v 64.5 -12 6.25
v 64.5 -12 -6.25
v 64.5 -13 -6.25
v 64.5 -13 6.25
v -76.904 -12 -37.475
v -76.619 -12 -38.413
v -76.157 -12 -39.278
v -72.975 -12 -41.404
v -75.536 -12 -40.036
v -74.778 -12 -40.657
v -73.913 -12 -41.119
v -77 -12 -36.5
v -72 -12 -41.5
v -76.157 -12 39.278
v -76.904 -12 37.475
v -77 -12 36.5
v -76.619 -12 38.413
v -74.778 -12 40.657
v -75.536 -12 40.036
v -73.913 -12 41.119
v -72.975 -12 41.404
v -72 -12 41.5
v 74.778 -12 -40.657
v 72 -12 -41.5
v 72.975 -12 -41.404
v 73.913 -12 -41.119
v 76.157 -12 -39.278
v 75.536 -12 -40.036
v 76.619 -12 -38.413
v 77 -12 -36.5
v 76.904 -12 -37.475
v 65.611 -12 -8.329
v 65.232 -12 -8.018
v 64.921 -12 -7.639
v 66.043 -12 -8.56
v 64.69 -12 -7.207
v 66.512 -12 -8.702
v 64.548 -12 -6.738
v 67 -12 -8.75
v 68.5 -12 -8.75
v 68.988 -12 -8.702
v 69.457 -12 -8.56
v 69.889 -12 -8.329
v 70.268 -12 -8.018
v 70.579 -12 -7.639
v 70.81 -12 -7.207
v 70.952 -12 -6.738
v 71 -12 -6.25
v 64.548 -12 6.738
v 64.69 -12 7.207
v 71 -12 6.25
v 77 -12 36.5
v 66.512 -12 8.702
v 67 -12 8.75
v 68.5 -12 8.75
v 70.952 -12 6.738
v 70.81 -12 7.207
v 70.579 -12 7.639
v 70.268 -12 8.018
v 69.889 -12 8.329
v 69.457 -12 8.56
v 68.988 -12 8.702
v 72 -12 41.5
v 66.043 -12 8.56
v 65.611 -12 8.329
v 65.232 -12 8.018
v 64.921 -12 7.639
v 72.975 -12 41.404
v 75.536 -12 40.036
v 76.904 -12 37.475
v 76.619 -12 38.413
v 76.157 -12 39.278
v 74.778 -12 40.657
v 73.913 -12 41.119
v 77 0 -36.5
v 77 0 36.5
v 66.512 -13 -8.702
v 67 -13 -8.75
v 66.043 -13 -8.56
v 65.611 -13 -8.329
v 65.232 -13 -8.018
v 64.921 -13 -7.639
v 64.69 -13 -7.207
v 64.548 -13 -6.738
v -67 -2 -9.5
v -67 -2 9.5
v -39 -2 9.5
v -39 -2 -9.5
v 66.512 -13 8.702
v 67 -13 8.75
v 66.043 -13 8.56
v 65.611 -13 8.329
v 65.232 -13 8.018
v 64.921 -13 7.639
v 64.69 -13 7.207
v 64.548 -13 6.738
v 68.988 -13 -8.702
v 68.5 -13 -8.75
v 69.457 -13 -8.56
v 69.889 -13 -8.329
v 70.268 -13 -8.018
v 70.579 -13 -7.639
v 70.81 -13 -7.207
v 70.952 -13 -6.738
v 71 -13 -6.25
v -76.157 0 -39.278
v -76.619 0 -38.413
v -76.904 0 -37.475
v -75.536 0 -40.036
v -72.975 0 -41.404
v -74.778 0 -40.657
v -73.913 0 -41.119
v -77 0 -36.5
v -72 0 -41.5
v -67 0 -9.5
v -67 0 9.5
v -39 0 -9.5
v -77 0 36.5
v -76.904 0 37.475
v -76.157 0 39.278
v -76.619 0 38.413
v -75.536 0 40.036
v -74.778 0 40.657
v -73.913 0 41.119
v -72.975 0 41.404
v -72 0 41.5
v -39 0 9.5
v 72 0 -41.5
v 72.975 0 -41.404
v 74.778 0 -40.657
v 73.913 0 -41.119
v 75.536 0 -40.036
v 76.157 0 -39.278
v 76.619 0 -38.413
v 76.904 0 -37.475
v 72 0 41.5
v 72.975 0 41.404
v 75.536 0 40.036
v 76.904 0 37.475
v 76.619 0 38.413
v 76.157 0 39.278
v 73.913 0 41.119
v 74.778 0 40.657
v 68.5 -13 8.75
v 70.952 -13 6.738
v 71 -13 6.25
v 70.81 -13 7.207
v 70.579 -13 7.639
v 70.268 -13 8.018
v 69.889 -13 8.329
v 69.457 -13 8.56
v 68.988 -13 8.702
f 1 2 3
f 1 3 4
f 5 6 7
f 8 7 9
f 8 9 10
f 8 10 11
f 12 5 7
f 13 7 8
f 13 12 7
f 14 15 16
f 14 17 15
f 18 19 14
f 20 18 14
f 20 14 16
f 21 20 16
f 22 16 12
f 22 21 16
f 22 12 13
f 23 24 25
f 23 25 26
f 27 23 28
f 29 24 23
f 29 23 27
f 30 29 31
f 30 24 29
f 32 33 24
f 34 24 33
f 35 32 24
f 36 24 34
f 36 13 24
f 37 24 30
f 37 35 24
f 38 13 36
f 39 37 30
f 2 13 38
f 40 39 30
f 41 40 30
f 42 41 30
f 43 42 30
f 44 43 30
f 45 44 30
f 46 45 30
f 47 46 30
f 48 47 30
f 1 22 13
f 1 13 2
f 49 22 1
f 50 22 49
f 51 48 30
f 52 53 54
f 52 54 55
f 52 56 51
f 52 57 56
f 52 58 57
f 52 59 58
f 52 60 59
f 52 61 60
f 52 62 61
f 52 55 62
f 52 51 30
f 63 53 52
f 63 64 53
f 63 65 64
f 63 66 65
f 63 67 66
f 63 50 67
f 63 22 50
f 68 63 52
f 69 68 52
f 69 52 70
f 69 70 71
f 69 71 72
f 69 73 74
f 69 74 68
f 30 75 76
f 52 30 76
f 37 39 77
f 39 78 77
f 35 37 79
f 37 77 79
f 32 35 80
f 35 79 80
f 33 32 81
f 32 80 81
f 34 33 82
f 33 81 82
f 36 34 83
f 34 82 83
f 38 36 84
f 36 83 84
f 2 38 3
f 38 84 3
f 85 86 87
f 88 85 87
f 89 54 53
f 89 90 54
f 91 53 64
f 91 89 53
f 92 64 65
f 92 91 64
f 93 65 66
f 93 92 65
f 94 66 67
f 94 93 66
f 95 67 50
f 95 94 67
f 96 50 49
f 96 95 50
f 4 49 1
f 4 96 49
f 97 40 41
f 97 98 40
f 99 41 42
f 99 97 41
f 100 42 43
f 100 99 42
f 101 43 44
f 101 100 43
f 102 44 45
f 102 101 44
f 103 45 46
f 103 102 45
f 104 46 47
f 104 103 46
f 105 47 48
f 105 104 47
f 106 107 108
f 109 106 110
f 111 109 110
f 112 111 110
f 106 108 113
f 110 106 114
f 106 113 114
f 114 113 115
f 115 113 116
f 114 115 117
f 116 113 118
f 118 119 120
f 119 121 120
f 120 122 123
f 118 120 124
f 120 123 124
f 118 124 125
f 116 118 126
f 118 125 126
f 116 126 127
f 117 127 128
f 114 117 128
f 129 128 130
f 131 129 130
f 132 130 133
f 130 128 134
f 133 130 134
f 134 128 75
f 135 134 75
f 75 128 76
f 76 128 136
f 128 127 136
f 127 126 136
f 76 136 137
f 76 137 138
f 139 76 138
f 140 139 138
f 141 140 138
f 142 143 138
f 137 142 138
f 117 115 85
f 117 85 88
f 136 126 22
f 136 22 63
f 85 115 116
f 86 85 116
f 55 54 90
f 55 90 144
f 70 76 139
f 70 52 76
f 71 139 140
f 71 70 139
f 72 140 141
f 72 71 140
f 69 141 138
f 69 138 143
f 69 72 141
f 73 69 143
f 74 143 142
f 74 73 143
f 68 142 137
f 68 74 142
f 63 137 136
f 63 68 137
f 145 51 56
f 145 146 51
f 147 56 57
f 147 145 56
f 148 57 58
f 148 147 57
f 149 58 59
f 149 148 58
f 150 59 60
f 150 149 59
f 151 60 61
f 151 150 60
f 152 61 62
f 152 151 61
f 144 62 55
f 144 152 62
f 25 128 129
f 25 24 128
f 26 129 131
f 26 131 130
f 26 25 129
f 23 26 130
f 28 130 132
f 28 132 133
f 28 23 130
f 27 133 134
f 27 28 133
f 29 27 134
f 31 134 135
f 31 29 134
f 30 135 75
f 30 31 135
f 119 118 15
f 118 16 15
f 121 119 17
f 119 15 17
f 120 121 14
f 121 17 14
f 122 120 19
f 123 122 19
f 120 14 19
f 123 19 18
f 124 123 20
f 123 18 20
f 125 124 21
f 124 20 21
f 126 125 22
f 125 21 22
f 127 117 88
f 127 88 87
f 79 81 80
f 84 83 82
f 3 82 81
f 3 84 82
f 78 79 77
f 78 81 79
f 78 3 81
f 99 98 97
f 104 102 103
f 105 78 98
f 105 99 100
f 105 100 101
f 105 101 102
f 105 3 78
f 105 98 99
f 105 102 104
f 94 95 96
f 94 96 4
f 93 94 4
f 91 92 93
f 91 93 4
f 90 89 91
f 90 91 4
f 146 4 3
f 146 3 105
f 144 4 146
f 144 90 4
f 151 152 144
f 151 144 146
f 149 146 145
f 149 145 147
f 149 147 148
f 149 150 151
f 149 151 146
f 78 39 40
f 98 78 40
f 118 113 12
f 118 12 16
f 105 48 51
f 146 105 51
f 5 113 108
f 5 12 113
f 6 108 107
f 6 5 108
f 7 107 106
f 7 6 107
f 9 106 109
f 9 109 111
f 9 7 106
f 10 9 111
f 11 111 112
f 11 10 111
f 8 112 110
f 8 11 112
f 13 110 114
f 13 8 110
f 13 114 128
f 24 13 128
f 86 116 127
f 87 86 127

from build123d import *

# Parameters (mm, degrees)
F0_W     = 154
F0_H     = 83
F1_DEPTH = 12
F2_R     = 5
F3_W     = 6.5
F3_H     = 17.5
F4_DEPTH = 1
F5_R     = 2.5
F6_W     = 28
F6_H     = 19
F7_DEPTH = 2


with BuildPart() as f1:
    # F0 (on Front) → F1 (new body)
    with BuildSketch(Plane.XZ):
        Rectangle(F0_W, F0_H)
    extrude(amount=F1_DEPTH)

    # F2
    f2_edges = [f1.edges().sort_by_distance(p)[0] for p in [
        (-77, -6, 41.5),
        (77, -6, 41.5),
        (77, -6, -41.5),
        (-77, -6, -41.5),
    ]]
    fillet(f2_edges, radius=F2_R)

    # F3 (on face) → F4 (join)
    with BuildSketch(Plane.XZ.offset(12)):
        with Locations((67.75, 0)):
            Rectangle(F3_W, F3_H)
    extrude(amount=F4_DEPTH)

    # F5
    f5_edges = [f1.edges().sort_by_distance(p)[0] for p in [
        (71, -12.5, -8.75),
        (71, -12.5, 8.75),
        (64.5, -12.5, 8.75),
        (64.5, -12.5, -8.75),
    ]]
    fillet(f5_edges, radius=F5_R)

    # F6 (on Front) → F7 (cut)
    with BuildSketch(Plane.XZ):
        with Locations((-53, 0)):
            Rectangle(F6_W, F6_H)
    extrude(amount=F7_DEPTH, mode=Mode.SUBTRACT)


solid = f1.part
